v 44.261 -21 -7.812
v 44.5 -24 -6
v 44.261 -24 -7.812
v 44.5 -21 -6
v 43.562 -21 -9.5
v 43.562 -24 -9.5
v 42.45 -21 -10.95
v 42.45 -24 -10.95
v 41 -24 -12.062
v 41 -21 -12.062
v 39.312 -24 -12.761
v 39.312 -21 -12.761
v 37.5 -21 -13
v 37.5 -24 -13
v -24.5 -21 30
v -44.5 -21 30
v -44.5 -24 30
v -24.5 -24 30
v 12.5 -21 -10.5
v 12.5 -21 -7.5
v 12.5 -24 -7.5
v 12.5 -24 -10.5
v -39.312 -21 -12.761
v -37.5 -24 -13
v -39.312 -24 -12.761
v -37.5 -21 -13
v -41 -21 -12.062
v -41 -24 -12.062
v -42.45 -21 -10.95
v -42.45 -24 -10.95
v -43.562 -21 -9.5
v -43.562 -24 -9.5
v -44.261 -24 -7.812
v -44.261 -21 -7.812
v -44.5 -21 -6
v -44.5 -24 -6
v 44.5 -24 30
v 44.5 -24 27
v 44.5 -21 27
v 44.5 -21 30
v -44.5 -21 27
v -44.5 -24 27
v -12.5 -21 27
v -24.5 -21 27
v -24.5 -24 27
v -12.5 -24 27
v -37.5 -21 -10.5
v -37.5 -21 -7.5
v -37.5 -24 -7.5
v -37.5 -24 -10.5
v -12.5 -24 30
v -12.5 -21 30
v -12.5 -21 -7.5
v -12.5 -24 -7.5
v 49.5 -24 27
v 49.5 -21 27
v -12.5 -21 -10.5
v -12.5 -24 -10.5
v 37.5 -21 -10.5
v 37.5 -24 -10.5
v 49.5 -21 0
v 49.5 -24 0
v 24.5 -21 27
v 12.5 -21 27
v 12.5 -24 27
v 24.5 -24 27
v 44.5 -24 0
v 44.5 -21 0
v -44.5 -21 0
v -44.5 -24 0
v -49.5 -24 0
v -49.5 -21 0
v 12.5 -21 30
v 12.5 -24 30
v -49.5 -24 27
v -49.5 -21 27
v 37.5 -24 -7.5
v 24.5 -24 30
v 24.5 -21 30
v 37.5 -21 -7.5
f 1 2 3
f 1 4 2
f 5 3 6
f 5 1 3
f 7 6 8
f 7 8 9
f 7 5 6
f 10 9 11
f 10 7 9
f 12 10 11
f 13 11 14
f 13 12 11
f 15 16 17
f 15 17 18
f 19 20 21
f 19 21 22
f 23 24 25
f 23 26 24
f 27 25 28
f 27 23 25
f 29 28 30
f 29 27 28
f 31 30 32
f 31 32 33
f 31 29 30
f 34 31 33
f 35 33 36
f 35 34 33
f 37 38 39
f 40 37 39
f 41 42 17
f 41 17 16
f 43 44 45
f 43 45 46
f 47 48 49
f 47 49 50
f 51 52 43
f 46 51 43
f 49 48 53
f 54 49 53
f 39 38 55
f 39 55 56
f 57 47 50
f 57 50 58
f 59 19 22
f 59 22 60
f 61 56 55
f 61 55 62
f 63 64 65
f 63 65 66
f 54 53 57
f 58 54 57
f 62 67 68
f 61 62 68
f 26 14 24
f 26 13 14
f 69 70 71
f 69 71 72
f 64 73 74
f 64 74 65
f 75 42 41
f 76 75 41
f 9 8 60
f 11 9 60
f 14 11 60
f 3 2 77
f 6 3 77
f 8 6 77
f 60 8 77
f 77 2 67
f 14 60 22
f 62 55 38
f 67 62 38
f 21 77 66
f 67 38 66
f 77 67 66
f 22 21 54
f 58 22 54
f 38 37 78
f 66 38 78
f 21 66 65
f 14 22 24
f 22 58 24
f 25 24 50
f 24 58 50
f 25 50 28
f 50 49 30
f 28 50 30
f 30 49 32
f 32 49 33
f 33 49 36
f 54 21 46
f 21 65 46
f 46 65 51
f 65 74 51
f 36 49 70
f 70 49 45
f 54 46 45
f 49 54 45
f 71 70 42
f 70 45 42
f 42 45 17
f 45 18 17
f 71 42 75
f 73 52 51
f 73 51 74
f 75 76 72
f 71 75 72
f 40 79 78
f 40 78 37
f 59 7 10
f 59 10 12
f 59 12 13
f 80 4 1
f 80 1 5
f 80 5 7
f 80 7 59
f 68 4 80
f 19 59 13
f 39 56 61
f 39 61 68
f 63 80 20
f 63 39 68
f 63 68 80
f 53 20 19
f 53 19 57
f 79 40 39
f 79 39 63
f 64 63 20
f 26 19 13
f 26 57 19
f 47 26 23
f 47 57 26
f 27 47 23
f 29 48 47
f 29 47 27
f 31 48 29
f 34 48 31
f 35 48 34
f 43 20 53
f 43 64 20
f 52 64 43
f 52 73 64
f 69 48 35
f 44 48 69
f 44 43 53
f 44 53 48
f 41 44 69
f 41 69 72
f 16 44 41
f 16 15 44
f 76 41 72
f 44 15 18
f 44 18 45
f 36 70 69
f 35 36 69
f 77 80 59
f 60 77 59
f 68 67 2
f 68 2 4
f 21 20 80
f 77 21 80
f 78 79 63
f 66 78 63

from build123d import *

# Parameters (mm, degrees)
ESTRUSIONE_ESTRUSIONE1_DEPTH      = 30
ESTRUSIONE_ESTRUSIONE1_DEPTH_BACK = 3
SCHIZZO1_W                        = 89
SCHIZZO1_H                        = 3
SCHIZZO2_W                        = 12
SCHIZZO2_H                        = 3
TAGLIO_ESTRUSIONE1_DEPTH          = 10
SCHIZZO3_W                        = 27
SCHIZZO3_H                        = 3
ESTRUSIONE_ESTRUSIONE2_DEPTH      = 5
SCHIZZO4_W                        = 89
SCHIZZO4_H                        = 3
ESTRUSIONE_ESTRUSIONE3_DEPTH      = 10
SCHIZZO5_W                        = 25
SCHIZZO5_H                        = 3
TAGLIO_ESTRUSIONE2_DEPTH          = 8
RACCORDO1_R                       = 7


with BuildPart() as part:
    # Schizzo1 → Estrusione-Estrusione1 (new, two sides: drawn at the far end of the back side and taken through both)
    with BuildSketch(Plane.XY.offset(-ESTRUSIONE_ESTRUSIONE1_DEPTH_BACK)):
        with Locations((0, -22.5)):
            Rectangle(SCHIZZO1_W, SCHIZZO1_H)
    extrude(amount=ESTRUSIONE_ESTRUSIONE1_DEPTH + ESTRUSIONE_ESTRUSIONE1_DEPTH_BACK)

    # Schizzo2 → Taglio-Estrusione1 (cut)
    with BuildSketch(Plane(origin=(0, -21, 0), x_dir=(1, 0, 0), z_dir=(0, 1, 0))):
        with Locations((18.5, -28.5)):
            Rectangle(SCHIZZO2_W, SCHIZZO2_H)
        with Locations((-18.5, -28.5)):
            Rectangle(SCHIZZO2_W, SCHIZZO2_H)
    extrude(amount=-TAGLIO_ESTRUSIONE1_DEPTH, mode=Mode.SUBTRACT)

    # Schizzo3 → Estrusione-Estrusione2 (add)
    with BuildSketch(Plane(origin=(44.5, 0, 0), x_dir=(0, 0, -1), z_dir=(1, 0, 0))):
        with Locations((-13.5, -22.5)):
            Rectangle(SCHIZZO3_W, SCHIZZO3_H)
    estrusione_estrusione2 = extrude(amount=ESTRUSIONE_ESTRUSIONE2_DEPTH)

    # Specchia1: Estrusione-Estrusione2 across plane
    add(estrusione_estrusione2.mirror(Plane(origin=(0, 0, 0), x_dir=(0, 0, 1), z_dir=(1, 0, 0))))

    # Schizzo4 → Estrusione-Estrusione3 (add)
    with BuildSketch(Plane(origin=(0, 0, -3), x_dir=(-1, 0, 0), z_dir=(0, 0, -1))):
        with Locations((0, -22.5)):
            Rectangle(SCHIZZO4_W, SCHIZZO4_H)
    extrude(amount=ESTRUSIONE_ESTRUSIONE3_DEPTH)

    # Schizzo5 → Taglio-Estrusione2 (cut)
    with BuildSketch(Plane(origin=(0, -21, 0), x_dir=(1, 0, 0), z_dir=(0, 1, 0))):
        with Locations((-25, 9)):
            Rectangle(SCHIZZO5_W, SCHIZZO5_H)
        with Locations((25, 9)):
            Rectangle(SCHIZZO5_W, SCHIZZO5_H)
    extrude(amount=-TAGLIO_ESTRUSIONE2_DEPTH, mode=Mode.SUBTRACT)

    # Raccordo1
    raccordo1_edges = [part.edges().sort_by_distance(p)[0] for p in [
        (-44.5, -22.5, -13),
        (44.5, -22.5, -13),
    ]]
    fillet(raccordo1_edges, radius=RACCORDO1_R)


solid = part.part
